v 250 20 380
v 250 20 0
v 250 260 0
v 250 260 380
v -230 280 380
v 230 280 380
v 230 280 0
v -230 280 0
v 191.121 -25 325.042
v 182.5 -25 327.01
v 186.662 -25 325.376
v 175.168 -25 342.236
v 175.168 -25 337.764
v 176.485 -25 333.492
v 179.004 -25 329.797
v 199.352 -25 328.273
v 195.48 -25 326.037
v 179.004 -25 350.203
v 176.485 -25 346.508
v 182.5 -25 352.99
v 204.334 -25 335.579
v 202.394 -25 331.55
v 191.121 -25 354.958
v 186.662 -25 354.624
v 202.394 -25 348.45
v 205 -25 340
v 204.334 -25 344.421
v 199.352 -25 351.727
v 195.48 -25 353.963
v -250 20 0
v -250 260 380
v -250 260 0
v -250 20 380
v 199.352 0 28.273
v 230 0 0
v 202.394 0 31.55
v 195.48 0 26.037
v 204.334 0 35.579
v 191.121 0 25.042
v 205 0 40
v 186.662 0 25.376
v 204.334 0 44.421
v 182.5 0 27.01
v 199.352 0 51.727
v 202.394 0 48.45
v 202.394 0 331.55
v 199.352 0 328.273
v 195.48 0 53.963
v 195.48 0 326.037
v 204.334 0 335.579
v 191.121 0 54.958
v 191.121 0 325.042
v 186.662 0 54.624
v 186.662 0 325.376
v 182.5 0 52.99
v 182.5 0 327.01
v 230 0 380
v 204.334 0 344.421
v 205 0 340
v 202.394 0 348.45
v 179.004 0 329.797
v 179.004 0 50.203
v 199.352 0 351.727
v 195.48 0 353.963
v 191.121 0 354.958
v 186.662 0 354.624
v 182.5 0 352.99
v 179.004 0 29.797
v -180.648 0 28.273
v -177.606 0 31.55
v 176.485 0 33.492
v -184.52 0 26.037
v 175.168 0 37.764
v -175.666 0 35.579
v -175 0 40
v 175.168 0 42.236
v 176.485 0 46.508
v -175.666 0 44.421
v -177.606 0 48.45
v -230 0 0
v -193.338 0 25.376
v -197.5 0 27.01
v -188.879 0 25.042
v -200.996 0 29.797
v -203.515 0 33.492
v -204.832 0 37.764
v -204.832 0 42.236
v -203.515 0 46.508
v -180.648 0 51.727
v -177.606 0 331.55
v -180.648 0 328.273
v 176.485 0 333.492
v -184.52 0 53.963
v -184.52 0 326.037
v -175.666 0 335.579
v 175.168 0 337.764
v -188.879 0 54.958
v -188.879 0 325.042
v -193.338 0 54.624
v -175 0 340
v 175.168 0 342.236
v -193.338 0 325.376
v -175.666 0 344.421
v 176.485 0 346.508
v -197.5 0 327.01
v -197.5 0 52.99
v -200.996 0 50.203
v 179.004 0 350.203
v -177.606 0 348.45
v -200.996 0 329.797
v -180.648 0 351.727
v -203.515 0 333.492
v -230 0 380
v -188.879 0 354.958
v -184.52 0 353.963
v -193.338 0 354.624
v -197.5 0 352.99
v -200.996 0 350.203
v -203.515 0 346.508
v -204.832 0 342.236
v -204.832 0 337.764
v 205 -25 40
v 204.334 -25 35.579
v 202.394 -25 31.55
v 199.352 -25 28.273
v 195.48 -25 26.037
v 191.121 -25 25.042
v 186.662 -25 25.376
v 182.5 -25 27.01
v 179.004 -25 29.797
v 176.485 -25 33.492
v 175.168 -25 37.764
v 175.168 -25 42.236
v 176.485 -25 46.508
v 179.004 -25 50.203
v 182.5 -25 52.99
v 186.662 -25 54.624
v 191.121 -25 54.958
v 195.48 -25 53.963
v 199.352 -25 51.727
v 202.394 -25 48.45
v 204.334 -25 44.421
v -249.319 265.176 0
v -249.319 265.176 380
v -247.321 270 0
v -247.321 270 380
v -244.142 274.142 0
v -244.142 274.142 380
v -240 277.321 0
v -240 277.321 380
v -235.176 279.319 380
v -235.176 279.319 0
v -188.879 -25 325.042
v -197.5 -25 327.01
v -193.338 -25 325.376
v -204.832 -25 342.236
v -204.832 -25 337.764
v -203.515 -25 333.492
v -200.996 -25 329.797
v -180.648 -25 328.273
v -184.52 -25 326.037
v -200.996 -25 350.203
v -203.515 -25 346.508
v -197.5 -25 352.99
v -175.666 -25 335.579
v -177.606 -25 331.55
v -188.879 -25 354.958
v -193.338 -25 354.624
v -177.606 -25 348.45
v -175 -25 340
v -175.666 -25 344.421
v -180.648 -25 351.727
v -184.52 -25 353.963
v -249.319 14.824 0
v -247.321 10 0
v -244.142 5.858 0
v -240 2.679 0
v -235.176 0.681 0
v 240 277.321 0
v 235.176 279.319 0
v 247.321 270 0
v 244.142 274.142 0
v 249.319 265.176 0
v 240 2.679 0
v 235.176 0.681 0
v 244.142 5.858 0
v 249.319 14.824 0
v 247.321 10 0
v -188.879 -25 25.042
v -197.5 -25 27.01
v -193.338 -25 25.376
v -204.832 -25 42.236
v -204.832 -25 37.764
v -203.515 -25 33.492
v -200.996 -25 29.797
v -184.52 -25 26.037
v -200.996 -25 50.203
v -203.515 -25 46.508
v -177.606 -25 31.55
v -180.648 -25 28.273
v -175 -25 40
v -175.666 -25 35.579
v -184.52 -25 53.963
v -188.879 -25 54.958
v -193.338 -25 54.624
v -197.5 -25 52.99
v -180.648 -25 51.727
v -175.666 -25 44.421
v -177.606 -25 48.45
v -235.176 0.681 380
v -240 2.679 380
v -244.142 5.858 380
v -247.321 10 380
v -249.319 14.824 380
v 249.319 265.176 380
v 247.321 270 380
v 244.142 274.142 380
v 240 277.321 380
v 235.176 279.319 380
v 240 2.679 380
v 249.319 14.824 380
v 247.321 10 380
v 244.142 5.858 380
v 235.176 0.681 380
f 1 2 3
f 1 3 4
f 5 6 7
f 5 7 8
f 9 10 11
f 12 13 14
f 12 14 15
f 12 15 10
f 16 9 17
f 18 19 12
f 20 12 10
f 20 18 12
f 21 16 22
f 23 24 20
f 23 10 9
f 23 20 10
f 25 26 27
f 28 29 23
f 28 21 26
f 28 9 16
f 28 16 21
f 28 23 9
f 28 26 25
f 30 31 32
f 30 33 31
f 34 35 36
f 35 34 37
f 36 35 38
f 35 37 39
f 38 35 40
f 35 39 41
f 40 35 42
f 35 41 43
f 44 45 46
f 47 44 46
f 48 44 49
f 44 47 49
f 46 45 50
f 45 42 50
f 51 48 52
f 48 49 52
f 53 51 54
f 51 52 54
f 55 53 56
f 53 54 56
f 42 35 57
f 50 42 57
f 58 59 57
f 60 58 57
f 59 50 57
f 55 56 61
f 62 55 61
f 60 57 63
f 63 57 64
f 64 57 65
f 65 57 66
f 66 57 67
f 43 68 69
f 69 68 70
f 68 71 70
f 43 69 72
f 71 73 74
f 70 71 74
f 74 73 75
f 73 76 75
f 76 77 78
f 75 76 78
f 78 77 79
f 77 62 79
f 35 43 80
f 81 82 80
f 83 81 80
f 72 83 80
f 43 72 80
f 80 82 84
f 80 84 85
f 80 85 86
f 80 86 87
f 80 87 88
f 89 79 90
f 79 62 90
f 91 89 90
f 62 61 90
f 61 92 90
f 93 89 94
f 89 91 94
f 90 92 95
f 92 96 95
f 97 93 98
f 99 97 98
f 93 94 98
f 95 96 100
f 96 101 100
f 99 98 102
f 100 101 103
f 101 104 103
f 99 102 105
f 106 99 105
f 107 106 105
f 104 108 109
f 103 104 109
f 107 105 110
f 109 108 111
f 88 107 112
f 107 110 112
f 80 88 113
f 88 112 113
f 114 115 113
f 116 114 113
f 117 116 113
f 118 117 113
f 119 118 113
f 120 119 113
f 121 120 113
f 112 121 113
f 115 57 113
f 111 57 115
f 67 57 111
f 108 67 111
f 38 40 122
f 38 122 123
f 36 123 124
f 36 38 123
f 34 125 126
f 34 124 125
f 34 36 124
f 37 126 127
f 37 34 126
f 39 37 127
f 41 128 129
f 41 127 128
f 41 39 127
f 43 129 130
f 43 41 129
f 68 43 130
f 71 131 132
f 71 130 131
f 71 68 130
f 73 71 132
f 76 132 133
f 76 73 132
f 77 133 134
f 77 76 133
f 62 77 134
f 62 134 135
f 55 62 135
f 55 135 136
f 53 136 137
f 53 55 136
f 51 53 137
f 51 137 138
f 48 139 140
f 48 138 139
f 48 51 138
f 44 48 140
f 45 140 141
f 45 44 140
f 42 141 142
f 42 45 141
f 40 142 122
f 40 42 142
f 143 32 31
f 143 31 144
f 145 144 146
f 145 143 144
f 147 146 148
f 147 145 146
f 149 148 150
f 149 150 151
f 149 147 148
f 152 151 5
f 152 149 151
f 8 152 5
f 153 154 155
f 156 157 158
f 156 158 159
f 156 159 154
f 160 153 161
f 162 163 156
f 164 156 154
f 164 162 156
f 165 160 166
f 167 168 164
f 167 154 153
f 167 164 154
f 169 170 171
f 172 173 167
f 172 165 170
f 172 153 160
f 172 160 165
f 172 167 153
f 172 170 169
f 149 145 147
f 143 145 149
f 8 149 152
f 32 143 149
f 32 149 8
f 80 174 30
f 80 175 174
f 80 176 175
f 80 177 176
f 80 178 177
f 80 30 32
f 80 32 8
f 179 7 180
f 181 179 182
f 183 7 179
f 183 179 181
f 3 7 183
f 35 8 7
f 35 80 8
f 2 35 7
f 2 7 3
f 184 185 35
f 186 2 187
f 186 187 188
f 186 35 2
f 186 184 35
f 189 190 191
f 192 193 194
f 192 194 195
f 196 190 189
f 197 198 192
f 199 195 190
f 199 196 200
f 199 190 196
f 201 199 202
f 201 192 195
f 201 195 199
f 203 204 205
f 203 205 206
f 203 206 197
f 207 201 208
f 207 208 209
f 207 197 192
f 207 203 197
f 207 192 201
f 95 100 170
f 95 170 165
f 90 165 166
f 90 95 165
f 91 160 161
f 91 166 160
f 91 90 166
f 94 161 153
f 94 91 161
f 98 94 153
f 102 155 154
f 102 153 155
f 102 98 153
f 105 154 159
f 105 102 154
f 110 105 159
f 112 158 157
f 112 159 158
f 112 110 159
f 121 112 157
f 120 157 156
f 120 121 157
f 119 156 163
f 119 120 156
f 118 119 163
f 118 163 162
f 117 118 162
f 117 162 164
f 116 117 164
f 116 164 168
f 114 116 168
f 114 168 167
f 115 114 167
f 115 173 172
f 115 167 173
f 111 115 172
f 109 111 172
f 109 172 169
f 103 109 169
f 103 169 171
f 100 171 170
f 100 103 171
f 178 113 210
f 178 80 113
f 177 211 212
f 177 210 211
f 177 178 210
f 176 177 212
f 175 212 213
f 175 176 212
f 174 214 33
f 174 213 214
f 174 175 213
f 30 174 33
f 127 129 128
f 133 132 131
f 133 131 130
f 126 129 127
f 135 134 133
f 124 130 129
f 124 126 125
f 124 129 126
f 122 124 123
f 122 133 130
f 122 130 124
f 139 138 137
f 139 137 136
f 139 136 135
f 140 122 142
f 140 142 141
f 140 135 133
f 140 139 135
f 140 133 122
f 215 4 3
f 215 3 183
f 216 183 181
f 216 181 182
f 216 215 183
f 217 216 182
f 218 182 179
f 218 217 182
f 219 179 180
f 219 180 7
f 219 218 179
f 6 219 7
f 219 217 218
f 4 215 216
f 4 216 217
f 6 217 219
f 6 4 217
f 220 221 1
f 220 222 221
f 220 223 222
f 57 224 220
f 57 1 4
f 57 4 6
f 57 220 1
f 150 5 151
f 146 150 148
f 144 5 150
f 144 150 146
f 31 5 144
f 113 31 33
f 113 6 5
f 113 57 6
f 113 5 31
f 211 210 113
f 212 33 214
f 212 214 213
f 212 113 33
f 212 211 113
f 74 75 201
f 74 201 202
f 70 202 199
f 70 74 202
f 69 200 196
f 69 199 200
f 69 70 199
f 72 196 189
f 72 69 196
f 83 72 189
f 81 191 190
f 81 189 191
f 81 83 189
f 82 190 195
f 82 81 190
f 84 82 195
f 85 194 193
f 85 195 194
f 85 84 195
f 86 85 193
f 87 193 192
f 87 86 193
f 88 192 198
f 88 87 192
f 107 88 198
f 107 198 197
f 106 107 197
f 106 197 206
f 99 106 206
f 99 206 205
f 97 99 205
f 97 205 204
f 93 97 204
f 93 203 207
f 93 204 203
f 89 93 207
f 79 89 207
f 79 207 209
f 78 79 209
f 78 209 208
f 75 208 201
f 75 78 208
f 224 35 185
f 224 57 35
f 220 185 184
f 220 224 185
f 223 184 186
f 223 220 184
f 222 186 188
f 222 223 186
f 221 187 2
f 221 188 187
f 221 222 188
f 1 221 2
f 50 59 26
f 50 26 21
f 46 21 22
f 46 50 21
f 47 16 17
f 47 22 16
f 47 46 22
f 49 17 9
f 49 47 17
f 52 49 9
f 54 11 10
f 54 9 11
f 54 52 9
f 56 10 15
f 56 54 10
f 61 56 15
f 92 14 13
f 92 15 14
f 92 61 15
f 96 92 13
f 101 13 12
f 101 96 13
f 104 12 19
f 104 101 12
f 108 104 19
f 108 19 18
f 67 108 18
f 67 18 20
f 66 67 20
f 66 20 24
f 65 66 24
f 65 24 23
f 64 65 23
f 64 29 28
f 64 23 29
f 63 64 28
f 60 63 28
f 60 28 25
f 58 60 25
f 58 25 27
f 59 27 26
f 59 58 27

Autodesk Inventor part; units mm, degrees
ref_plane "YZ Plane" through (0, 0, 0) normal (1, 0, 0) x (0, 1, 0)
ref_plane "XZ Plane" through (0, 0, 0) normal (0, 1, 0) x (-1, 0, 0)
ref_plane "XY Plane" through (0, 0, 0) normal (0, 0, 1) x (1, 0, 0)
sketch "Sketch1" plane through (0, 0, 0) normal (0, 1, 0) x (-1, 0, 0)
  line L0 (250, 0) -> (-250, 0)
  line L1 (-250, 0) -> (-250, 380)
  line L2 (-250, 380) -> (250, 380)
  line L3 (250, 380) -> (250, 0)
  point P0 (0, 0)
  point P1 (0, 0)
  dimension "d0" = 500
  dimension "d1" = 380
extrude "Extrusion1" add sketch "Sketch1" along normal blind 280
fillet "Fillet1" radius 20 4 edges at (-250, 280, 190) (-250, 0, 190) (250, 0, 190) (250, 280, 190)
sketch "Sketch2" plane through (-230, 0, 380) normal (0, 0, 1) x (1, 0, 0)
  line L0 (460, 280) -> (0, 280) projected
  line L1 (360, 280) -> (360, 0)
  line L2 (480, 20) -> (480, 260) projected
  line L3 (0, 0) -> (460, 0) projected
  point P0 (230, 0)
  dimension "d5" = 120
split_face "Split1"
sketch "Sketch3" plane through (0, 0, 0) normal (0, -1, 0) x (1, 0, 0)
  circle A0 centre (-190, 340) radius 15
  line L0 (230, 380) -> (230, 0) projected
  line L1 (130, 380) -> (230, 380) projected
  line L2 (-230, 380) -> (130, 380) projected
  line L3 (-230, 0) -> (-230, 380) projected
  line L4 (230, 0) -> (-230, 0) projected
  line L5 (130, 340) -> (190, 340) construction
  line L6 (190, 340) -> (190, 40) construction
  line L7 (190, 40) -> (-190, 40) construction
  line L8 (-190, 40) -> (-190, 340) construction
  line L9 (-190, 340) -> (130, 340) construction
  circle A1 centre (-190, 40) radius 15
  circle A2 centre (190, 40) radius 15
  circle A3 centre (190, 340) radius 15
  point P0 (0, 0)
  dimension "d6" = 30
  dimension "d7" = 40
extrude "Extrusion2" add sketch "Sketch3" along normal blind 25 contours A0 | A1 | A2 | A3
properties part number "Microonde" material "Steel, Galvanized"
